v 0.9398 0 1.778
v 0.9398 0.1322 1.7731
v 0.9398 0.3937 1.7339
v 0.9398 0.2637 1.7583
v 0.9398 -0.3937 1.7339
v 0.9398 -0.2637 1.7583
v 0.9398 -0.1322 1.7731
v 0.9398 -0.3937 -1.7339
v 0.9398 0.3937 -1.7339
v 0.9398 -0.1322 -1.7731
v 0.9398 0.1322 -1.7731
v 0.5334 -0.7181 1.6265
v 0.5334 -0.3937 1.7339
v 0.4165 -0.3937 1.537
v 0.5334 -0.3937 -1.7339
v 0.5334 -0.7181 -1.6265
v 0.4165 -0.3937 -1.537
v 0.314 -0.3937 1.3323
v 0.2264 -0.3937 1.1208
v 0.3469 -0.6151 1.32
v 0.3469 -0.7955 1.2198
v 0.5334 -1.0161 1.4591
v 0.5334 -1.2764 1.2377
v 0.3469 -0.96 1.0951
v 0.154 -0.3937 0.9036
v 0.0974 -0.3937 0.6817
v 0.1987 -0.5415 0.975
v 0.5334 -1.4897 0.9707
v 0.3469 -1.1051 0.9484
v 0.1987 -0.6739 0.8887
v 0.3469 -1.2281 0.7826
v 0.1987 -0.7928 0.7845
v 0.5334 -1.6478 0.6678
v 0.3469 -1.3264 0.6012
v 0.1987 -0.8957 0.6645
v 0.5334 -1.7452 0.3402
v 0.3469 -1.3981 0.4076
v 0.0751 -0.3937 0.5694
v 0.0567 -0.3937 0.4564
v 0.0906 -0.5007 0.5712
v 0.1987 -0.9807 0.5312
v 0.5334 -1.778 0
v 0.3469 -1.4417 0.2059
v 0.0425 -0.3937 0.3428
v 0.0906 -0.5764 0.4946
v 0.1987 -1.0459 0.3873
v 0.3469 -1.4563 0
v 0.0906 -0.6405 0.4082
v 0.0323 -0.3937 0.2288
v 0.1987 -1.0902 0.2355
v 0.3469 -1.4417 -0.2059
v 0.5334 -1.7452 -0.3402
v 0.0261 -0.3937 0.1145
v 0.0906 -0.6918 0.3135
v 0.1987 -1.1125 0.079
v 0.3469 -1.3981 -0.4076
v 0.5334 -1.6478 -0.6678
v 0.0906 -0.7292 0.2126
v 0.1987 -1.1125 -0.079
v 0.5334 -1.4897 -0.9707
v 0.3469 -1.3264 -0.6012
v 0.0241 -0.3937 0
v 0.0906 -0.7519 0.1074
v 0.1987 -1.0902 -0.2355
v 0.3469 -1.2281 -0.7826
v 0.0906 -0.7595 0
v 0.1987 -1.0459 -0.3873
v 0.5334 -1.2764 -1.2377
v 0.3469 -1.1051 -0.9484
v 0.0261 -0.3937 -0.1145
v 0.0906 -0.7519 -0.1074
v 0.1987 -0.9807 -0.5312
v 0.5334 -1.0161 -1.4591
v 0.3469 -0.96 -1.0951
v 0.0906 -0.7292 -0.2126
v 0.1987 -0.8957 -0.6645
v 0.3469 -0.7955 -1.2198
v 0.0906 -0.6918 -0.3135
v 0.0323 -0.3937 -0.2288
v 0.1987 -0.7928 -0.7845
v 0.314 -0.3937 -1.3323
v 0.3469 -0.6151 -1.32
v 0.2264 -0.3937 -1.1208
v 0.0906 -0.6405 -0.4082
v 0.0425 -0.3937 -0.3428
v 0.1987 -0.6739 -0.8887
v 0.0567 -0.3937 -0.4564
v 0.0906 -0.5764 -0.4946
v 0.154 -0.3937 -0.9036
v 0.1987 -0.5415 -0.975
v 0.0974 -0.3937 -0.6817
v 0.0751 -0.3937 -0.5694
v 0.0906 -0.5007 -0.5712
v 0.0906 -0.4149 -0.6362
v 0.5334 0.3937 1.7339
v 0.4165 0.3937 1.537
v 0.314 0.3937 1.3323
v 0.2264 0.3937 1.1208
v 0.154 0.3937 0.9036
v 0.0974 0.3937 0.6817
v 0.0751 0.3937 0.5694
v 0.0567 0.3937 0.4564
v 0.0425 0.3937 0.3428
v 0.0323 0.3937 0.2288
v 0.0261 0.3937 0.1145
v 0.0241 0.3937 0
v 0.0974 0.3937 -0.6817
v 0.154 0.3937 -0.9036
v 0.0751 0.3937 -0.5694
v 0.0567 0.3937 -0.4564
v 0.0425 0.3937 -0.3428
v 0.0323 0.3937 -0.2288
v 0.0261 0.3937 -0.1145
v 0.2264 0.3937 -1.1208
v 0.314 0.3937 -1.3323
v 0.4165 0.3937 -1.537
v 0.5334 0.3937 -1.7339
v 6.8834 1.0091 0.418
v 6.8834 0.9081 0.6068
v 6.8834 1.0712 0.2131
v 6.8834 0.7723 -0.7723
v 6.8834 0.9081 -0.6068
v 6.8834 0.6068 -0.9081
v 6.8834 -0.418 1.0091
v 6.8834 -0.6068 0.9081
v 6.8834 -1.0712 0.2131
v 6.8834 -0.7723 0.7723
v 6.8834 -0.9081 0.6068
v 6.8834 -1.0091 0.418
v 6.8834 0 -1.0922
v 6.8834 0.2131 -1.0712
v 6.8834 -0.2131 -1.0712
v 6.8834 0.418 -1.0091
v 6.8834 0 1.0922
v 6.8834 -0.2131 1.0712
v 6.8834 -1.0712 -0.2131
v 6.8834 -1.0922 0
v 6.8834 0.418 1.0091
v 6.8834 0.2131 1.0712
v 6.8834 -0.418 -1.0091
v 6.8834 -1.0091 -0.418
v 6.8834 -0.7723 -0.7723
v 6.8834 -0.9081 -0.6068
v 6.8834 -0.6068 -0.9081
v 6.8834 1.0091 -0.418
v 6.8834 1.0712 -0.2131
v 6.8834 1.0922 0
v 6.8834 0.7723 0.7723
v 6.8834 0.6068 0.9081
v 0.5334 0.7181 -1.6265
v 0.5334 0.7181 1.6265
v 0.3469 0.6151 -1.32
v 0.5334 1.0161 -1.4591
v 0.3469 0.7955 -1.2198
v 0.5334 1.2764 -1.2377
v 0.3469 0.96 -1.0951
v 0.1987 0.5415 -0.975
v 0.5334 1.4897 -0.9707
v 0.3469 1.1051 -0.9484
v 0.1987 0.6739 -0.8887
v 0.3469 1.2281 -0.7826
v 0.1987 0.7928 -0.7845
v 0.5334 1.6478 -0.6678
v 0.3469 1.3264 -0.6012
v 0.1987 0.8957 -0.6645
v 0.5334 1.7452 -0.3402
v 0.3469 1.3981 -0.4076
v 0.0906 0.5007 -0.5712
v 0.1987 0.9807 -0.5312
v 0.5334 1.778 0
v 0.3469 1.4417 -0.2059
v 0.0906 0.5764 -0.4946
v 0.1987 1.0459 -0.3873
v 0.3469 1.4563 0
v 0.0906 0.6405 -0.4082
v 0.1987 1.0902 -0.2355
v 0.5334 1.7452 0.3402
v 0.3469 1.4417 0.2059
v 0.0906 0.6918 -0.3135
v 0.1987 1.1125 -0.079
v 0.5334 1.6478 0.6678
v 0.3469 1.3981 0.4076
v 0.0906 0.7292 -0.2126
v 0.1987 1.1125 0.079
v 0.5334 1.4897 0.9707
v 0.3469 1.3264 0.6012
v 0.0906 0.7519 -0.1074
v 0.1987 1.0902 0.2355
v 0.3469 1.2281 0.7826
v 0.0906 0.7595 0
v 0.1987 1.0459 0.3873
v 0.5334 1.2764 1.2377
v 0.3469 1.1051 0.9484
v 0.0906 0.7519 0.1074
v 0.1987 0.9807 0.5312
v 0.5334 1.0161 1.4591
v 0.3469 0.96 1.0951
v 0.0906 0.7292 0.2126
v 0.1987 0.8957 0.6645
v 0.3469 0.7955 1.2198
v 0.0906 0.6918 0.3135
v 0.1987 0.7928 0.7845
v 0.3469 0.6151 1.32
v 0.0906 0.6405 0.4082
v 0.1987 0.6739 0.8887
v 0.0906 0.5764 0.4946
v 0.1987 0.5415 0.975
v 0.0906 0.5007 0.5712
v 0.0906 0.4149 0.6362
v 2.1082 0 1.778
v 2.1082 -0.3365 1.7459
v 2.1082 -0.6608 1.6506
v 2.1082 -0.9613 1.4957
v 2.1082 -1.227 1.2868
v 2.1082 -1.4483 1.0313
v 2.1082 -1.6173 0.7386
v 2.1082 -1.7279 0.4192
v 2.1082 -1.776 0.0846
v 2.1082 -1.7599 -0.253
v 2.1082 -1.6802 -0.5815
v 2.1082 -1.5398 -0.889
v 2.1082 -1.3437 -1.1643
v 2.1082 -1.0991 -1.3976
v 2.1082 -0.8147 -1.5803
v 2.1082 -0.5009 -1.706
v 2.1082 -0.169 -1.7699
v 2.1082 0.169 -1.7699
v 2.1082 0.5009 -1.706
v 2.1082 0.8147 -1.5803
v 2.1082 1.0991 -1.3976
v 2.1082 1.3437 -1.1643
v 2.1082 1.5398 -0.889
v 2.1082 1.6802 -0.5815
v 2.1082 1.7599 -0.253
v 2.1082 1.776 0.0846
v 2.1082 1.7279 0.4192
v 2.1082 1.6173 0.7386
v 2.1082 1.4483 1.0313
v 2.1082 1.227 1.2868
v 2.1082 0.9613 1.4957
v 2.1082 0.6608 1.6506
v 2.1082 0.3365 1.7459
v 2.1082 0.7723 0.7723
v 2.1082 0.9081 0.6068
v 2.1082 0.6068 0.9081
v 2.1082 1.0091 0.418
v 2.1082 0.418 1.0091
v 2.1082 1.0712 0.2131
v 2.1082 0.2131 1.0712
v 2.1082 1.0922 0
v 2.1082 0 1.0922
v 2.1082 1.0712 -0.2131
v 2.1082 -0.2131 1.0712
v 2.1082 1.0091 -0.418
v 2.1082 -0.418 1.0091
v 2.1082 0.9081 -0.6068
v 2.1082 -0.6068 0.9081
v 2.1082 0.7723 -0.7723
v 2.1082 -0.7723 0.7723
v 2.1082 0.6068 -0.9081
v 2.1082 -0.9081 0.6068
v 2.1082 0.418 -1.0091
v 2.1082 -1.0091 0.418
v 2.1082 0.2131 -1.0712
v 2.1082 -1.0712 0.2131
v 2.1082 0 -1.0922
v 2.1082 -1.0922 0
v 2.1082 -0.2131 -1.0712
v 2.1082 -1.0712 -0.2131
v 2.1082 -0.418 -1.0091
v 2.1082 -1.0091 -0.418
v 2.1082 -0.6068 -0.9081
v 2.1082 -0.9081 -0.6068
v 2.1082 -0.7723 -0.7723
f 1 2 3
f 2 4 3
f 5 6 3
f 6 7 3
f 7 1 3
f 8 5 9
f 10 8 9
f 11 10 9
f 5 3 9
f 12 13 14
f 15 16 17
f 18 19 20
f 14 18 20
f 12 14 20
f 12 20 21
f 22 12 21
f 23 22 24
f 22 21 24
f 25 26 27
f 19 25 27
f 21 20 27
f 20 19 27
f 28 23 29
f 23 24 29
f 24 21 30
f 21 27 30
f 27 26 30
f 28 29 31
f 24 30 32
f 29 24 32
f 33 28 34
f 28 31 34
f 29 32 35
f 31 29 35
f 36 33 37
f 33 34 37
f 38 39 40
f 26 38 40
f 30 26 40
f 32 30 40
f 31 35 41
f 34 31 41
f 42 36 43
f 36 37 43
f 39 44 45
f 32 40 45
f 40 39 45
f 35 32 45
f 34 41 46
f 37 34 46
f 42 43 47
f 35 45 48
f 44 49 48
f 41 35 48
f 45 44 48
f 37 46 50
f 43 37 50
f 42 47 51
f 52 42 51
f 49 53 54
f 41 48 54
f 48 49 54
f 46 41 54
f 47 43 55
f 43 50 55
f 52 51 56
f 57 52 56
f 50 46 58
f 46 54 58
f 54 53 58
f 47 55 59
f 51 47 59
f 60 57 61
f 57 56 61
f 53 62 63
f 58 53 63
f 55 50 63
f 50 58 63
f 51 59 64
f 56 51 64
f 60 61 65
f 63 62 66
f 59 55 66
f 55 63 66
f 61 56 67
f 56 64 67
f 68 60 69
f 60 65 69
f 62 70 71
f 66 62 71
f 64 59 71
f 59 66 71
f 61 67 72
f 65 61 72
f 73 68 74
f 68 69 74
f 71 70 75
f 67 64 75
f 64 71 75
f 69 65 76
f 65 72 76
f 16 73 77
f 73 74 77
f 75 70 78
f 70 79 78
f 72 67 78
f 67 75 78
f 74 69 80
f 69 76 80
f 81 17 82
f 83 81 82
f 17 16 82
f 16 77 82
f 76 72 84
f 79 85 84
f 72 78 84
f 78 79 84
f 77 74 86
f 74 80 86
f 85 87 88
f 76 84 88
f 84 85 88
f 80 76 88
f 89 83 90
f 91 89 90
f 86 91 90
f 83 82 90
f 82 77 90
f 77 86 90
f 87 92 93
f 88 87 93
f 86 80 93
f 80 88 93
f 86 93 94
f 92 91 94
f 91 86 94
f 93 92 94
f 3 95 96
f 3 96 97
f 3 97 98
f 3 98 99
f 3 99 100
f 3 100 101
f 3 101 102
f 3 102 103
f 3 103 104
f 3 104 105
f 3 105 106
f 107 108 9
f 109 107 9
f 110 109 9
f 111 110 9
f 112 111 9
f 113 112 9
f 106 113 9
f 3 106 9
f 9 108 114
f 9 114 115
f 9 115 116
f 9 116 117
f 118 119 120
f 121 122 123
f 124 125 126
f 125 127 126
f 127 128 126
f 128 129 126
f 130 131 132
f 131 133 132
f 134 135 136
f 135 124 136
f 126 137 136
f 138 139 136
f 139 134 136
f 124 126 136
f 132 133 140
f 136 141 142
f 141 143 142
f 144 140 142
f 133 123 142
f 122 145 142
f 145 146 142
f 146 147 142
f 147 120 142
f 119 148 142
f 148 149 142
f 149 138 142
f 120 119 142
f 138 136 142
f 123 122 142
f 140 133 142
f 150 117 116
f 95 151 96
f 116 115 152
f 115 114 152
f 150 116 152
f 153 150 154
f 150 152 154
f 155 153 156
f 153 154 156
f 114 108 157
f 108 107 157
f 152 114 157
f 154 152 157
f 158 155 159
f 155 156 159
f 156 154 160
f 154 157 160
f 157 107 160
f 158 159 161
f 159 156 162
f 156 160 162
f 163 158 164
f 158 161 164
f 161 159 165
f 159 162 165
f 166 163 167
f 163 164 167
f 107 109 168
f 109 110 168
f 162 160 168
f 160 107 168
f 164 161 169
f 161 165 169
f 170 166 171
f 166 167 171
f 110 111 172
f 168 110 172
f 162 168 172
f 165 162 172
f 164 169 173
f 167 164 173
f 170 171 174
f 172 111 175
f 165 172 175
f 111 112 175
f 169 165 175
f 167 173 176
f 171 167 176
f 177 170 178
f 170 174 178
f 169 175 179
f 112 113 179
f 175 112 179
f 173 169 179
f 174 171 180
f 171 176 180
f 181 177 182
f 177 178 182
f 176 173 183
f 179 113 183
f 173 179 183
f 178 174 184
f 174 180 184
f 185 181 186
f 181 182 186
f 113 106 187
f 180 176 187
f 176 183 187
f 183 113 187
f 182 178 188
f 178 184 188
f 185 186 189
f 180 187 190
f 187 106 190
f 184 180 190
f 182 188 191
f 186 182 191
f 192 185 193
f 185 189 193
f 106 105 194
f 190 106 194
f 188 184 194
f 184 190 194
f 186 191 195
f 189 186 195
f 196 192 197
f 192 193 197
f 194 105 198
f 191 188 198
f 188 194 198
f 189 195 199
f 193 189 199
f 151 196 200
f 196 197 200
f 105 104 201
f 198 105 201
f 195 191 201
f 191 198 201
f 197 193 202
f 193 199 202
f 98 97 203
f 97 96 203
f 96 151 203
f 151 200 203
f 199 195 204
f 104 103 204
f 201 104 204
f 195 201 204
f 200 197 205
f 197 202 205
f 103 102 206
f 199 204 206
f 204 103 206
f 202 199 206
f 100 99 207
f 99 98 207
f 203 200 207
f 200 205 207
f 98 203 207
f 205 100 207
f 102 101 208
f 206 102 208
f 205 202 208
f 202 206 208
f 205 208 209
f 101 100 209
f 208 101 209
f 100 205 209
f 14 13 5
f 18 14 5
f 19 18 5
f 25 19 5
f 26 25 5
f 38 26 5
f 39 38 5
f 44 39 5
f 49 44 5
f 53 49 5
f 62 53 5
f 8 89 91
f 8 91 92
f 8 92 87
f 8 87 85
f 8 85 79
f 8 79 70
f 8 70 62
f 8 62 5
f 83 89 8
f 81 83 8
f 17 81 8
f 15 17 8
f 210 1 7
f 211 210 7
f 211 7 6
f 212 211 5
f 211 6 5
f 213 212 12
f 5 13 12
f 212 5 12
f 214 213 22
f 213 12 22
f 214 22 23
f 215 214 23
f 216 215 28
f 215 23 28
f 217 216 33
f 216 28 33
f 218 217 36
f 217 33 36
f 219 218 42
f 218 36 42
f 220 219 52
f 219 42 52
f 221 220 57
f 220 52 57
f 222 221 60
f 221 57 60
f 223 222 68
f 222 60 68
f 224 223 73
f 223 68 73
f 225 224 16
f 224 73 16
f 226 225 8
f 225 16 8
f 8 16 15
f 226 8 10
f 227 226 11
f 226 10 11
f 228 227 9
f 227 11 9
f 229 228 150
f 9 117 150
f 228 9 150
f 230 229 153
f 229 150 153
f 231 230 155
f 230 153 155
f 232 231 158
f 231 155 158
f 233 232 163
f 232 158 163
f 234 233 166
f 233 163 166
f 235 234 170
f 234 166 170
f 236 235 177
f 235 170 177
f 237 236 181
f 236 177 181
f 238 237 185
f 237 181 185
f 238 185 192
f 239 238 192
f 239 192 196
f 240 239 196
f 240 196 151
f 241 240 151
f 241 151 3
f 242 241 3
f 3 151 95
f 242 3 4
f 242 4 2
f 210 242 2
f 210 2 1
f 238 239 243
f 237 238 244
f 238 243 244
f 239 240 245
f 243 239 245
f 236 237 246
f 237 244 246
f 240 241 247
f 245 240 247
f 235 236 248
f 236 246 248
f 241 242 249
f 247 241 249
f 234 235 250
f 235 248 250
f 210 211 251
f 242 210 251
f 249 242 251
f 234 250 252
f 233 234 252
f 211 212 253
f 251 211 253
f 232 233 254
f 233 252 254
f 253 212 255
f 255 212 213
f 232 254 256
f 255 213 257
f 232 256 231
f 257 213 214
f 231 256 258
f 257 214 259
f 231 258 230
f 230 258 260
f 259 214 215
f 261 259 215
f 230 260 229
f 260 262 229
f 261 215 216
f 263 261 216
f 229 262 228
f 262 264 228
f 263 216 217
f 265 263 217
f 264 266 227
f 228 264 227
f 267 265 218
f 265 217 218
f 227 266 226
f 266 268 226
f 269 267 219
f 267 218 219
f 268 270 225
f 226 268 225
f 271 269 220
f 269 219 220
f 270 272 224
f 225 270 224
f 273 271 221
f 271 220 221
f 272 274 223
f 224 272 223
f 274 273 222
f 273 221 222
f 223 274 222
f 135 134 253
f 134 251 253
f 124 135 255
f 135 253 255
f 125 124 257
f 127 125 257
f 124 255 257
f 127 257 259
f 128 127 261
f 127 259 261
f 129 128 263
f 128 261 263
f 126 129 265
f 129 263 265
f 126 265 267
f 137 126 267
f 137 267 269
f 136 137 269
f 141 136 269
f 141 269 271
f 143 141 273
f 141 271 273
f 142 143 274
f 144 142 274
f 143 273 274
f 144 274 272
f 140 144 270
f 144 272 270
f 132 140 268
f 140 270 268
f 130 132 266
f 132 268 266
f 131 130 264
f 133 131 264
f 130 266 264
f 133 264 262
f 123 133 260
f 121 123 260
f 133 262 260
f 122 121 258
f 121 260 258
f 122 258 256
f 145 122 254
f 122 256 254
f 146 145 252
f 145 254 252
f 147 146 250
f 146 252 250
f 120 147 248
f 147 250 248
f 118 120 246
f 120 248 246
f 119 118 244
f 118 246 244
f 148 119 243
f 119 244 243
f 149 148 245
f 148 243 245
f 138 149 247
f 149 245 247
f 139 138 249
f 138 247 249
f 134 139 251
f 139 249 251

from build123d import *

# Parameters (mm, degrees)
SKETCH2_W  = 3.556
SKETCH2_H  = 0.7874
SLOT_DEPTH = 0.9398


with BuildPart() as part:
    # BodySke → Base-Revolve (revolve)
    with BuildSketch(Plane.XY, mode=Mode.PRIVATE) as base_revolve_sk:
        with BuildLine():
            Line((2.1082, 1.0922), (2.1082, 1.778))
            Line((2.1082, 1.778), (0.5334, 1.778))
            ThreePointArc((0.5334, 1.778), (0.136222505, 0.928143249), (0, 0))
            Line((0, 0), (6.8834, 0))
            Line((6.8834, 0), (6.8834, 1.0922))
            Line((6.8834, 1.0922), (2.1082, 1.0922))
        make_face()
    revolve(base_revolve_sk.sketch.rotate(Axis((-9.603521982, 0, 0), (1, 0, 0)), 90), axis=Axis((-9.603521982, 0, 0), (1, 0, 0)))  # turned: the seam where the file's is

    # Sketch2 → Slot (cut)
    with BuildSketch(Plane(origin=(0, 0, 0), x_dir=(0, 0, -1), z_dir=(1, 0, 0))):
        Rectangle(SKETCH2_W, SKETCH2_H)
    extrude(amount=SLOT_DEPTH, mode=Mode.SUBTRACT)


solid = part.part
